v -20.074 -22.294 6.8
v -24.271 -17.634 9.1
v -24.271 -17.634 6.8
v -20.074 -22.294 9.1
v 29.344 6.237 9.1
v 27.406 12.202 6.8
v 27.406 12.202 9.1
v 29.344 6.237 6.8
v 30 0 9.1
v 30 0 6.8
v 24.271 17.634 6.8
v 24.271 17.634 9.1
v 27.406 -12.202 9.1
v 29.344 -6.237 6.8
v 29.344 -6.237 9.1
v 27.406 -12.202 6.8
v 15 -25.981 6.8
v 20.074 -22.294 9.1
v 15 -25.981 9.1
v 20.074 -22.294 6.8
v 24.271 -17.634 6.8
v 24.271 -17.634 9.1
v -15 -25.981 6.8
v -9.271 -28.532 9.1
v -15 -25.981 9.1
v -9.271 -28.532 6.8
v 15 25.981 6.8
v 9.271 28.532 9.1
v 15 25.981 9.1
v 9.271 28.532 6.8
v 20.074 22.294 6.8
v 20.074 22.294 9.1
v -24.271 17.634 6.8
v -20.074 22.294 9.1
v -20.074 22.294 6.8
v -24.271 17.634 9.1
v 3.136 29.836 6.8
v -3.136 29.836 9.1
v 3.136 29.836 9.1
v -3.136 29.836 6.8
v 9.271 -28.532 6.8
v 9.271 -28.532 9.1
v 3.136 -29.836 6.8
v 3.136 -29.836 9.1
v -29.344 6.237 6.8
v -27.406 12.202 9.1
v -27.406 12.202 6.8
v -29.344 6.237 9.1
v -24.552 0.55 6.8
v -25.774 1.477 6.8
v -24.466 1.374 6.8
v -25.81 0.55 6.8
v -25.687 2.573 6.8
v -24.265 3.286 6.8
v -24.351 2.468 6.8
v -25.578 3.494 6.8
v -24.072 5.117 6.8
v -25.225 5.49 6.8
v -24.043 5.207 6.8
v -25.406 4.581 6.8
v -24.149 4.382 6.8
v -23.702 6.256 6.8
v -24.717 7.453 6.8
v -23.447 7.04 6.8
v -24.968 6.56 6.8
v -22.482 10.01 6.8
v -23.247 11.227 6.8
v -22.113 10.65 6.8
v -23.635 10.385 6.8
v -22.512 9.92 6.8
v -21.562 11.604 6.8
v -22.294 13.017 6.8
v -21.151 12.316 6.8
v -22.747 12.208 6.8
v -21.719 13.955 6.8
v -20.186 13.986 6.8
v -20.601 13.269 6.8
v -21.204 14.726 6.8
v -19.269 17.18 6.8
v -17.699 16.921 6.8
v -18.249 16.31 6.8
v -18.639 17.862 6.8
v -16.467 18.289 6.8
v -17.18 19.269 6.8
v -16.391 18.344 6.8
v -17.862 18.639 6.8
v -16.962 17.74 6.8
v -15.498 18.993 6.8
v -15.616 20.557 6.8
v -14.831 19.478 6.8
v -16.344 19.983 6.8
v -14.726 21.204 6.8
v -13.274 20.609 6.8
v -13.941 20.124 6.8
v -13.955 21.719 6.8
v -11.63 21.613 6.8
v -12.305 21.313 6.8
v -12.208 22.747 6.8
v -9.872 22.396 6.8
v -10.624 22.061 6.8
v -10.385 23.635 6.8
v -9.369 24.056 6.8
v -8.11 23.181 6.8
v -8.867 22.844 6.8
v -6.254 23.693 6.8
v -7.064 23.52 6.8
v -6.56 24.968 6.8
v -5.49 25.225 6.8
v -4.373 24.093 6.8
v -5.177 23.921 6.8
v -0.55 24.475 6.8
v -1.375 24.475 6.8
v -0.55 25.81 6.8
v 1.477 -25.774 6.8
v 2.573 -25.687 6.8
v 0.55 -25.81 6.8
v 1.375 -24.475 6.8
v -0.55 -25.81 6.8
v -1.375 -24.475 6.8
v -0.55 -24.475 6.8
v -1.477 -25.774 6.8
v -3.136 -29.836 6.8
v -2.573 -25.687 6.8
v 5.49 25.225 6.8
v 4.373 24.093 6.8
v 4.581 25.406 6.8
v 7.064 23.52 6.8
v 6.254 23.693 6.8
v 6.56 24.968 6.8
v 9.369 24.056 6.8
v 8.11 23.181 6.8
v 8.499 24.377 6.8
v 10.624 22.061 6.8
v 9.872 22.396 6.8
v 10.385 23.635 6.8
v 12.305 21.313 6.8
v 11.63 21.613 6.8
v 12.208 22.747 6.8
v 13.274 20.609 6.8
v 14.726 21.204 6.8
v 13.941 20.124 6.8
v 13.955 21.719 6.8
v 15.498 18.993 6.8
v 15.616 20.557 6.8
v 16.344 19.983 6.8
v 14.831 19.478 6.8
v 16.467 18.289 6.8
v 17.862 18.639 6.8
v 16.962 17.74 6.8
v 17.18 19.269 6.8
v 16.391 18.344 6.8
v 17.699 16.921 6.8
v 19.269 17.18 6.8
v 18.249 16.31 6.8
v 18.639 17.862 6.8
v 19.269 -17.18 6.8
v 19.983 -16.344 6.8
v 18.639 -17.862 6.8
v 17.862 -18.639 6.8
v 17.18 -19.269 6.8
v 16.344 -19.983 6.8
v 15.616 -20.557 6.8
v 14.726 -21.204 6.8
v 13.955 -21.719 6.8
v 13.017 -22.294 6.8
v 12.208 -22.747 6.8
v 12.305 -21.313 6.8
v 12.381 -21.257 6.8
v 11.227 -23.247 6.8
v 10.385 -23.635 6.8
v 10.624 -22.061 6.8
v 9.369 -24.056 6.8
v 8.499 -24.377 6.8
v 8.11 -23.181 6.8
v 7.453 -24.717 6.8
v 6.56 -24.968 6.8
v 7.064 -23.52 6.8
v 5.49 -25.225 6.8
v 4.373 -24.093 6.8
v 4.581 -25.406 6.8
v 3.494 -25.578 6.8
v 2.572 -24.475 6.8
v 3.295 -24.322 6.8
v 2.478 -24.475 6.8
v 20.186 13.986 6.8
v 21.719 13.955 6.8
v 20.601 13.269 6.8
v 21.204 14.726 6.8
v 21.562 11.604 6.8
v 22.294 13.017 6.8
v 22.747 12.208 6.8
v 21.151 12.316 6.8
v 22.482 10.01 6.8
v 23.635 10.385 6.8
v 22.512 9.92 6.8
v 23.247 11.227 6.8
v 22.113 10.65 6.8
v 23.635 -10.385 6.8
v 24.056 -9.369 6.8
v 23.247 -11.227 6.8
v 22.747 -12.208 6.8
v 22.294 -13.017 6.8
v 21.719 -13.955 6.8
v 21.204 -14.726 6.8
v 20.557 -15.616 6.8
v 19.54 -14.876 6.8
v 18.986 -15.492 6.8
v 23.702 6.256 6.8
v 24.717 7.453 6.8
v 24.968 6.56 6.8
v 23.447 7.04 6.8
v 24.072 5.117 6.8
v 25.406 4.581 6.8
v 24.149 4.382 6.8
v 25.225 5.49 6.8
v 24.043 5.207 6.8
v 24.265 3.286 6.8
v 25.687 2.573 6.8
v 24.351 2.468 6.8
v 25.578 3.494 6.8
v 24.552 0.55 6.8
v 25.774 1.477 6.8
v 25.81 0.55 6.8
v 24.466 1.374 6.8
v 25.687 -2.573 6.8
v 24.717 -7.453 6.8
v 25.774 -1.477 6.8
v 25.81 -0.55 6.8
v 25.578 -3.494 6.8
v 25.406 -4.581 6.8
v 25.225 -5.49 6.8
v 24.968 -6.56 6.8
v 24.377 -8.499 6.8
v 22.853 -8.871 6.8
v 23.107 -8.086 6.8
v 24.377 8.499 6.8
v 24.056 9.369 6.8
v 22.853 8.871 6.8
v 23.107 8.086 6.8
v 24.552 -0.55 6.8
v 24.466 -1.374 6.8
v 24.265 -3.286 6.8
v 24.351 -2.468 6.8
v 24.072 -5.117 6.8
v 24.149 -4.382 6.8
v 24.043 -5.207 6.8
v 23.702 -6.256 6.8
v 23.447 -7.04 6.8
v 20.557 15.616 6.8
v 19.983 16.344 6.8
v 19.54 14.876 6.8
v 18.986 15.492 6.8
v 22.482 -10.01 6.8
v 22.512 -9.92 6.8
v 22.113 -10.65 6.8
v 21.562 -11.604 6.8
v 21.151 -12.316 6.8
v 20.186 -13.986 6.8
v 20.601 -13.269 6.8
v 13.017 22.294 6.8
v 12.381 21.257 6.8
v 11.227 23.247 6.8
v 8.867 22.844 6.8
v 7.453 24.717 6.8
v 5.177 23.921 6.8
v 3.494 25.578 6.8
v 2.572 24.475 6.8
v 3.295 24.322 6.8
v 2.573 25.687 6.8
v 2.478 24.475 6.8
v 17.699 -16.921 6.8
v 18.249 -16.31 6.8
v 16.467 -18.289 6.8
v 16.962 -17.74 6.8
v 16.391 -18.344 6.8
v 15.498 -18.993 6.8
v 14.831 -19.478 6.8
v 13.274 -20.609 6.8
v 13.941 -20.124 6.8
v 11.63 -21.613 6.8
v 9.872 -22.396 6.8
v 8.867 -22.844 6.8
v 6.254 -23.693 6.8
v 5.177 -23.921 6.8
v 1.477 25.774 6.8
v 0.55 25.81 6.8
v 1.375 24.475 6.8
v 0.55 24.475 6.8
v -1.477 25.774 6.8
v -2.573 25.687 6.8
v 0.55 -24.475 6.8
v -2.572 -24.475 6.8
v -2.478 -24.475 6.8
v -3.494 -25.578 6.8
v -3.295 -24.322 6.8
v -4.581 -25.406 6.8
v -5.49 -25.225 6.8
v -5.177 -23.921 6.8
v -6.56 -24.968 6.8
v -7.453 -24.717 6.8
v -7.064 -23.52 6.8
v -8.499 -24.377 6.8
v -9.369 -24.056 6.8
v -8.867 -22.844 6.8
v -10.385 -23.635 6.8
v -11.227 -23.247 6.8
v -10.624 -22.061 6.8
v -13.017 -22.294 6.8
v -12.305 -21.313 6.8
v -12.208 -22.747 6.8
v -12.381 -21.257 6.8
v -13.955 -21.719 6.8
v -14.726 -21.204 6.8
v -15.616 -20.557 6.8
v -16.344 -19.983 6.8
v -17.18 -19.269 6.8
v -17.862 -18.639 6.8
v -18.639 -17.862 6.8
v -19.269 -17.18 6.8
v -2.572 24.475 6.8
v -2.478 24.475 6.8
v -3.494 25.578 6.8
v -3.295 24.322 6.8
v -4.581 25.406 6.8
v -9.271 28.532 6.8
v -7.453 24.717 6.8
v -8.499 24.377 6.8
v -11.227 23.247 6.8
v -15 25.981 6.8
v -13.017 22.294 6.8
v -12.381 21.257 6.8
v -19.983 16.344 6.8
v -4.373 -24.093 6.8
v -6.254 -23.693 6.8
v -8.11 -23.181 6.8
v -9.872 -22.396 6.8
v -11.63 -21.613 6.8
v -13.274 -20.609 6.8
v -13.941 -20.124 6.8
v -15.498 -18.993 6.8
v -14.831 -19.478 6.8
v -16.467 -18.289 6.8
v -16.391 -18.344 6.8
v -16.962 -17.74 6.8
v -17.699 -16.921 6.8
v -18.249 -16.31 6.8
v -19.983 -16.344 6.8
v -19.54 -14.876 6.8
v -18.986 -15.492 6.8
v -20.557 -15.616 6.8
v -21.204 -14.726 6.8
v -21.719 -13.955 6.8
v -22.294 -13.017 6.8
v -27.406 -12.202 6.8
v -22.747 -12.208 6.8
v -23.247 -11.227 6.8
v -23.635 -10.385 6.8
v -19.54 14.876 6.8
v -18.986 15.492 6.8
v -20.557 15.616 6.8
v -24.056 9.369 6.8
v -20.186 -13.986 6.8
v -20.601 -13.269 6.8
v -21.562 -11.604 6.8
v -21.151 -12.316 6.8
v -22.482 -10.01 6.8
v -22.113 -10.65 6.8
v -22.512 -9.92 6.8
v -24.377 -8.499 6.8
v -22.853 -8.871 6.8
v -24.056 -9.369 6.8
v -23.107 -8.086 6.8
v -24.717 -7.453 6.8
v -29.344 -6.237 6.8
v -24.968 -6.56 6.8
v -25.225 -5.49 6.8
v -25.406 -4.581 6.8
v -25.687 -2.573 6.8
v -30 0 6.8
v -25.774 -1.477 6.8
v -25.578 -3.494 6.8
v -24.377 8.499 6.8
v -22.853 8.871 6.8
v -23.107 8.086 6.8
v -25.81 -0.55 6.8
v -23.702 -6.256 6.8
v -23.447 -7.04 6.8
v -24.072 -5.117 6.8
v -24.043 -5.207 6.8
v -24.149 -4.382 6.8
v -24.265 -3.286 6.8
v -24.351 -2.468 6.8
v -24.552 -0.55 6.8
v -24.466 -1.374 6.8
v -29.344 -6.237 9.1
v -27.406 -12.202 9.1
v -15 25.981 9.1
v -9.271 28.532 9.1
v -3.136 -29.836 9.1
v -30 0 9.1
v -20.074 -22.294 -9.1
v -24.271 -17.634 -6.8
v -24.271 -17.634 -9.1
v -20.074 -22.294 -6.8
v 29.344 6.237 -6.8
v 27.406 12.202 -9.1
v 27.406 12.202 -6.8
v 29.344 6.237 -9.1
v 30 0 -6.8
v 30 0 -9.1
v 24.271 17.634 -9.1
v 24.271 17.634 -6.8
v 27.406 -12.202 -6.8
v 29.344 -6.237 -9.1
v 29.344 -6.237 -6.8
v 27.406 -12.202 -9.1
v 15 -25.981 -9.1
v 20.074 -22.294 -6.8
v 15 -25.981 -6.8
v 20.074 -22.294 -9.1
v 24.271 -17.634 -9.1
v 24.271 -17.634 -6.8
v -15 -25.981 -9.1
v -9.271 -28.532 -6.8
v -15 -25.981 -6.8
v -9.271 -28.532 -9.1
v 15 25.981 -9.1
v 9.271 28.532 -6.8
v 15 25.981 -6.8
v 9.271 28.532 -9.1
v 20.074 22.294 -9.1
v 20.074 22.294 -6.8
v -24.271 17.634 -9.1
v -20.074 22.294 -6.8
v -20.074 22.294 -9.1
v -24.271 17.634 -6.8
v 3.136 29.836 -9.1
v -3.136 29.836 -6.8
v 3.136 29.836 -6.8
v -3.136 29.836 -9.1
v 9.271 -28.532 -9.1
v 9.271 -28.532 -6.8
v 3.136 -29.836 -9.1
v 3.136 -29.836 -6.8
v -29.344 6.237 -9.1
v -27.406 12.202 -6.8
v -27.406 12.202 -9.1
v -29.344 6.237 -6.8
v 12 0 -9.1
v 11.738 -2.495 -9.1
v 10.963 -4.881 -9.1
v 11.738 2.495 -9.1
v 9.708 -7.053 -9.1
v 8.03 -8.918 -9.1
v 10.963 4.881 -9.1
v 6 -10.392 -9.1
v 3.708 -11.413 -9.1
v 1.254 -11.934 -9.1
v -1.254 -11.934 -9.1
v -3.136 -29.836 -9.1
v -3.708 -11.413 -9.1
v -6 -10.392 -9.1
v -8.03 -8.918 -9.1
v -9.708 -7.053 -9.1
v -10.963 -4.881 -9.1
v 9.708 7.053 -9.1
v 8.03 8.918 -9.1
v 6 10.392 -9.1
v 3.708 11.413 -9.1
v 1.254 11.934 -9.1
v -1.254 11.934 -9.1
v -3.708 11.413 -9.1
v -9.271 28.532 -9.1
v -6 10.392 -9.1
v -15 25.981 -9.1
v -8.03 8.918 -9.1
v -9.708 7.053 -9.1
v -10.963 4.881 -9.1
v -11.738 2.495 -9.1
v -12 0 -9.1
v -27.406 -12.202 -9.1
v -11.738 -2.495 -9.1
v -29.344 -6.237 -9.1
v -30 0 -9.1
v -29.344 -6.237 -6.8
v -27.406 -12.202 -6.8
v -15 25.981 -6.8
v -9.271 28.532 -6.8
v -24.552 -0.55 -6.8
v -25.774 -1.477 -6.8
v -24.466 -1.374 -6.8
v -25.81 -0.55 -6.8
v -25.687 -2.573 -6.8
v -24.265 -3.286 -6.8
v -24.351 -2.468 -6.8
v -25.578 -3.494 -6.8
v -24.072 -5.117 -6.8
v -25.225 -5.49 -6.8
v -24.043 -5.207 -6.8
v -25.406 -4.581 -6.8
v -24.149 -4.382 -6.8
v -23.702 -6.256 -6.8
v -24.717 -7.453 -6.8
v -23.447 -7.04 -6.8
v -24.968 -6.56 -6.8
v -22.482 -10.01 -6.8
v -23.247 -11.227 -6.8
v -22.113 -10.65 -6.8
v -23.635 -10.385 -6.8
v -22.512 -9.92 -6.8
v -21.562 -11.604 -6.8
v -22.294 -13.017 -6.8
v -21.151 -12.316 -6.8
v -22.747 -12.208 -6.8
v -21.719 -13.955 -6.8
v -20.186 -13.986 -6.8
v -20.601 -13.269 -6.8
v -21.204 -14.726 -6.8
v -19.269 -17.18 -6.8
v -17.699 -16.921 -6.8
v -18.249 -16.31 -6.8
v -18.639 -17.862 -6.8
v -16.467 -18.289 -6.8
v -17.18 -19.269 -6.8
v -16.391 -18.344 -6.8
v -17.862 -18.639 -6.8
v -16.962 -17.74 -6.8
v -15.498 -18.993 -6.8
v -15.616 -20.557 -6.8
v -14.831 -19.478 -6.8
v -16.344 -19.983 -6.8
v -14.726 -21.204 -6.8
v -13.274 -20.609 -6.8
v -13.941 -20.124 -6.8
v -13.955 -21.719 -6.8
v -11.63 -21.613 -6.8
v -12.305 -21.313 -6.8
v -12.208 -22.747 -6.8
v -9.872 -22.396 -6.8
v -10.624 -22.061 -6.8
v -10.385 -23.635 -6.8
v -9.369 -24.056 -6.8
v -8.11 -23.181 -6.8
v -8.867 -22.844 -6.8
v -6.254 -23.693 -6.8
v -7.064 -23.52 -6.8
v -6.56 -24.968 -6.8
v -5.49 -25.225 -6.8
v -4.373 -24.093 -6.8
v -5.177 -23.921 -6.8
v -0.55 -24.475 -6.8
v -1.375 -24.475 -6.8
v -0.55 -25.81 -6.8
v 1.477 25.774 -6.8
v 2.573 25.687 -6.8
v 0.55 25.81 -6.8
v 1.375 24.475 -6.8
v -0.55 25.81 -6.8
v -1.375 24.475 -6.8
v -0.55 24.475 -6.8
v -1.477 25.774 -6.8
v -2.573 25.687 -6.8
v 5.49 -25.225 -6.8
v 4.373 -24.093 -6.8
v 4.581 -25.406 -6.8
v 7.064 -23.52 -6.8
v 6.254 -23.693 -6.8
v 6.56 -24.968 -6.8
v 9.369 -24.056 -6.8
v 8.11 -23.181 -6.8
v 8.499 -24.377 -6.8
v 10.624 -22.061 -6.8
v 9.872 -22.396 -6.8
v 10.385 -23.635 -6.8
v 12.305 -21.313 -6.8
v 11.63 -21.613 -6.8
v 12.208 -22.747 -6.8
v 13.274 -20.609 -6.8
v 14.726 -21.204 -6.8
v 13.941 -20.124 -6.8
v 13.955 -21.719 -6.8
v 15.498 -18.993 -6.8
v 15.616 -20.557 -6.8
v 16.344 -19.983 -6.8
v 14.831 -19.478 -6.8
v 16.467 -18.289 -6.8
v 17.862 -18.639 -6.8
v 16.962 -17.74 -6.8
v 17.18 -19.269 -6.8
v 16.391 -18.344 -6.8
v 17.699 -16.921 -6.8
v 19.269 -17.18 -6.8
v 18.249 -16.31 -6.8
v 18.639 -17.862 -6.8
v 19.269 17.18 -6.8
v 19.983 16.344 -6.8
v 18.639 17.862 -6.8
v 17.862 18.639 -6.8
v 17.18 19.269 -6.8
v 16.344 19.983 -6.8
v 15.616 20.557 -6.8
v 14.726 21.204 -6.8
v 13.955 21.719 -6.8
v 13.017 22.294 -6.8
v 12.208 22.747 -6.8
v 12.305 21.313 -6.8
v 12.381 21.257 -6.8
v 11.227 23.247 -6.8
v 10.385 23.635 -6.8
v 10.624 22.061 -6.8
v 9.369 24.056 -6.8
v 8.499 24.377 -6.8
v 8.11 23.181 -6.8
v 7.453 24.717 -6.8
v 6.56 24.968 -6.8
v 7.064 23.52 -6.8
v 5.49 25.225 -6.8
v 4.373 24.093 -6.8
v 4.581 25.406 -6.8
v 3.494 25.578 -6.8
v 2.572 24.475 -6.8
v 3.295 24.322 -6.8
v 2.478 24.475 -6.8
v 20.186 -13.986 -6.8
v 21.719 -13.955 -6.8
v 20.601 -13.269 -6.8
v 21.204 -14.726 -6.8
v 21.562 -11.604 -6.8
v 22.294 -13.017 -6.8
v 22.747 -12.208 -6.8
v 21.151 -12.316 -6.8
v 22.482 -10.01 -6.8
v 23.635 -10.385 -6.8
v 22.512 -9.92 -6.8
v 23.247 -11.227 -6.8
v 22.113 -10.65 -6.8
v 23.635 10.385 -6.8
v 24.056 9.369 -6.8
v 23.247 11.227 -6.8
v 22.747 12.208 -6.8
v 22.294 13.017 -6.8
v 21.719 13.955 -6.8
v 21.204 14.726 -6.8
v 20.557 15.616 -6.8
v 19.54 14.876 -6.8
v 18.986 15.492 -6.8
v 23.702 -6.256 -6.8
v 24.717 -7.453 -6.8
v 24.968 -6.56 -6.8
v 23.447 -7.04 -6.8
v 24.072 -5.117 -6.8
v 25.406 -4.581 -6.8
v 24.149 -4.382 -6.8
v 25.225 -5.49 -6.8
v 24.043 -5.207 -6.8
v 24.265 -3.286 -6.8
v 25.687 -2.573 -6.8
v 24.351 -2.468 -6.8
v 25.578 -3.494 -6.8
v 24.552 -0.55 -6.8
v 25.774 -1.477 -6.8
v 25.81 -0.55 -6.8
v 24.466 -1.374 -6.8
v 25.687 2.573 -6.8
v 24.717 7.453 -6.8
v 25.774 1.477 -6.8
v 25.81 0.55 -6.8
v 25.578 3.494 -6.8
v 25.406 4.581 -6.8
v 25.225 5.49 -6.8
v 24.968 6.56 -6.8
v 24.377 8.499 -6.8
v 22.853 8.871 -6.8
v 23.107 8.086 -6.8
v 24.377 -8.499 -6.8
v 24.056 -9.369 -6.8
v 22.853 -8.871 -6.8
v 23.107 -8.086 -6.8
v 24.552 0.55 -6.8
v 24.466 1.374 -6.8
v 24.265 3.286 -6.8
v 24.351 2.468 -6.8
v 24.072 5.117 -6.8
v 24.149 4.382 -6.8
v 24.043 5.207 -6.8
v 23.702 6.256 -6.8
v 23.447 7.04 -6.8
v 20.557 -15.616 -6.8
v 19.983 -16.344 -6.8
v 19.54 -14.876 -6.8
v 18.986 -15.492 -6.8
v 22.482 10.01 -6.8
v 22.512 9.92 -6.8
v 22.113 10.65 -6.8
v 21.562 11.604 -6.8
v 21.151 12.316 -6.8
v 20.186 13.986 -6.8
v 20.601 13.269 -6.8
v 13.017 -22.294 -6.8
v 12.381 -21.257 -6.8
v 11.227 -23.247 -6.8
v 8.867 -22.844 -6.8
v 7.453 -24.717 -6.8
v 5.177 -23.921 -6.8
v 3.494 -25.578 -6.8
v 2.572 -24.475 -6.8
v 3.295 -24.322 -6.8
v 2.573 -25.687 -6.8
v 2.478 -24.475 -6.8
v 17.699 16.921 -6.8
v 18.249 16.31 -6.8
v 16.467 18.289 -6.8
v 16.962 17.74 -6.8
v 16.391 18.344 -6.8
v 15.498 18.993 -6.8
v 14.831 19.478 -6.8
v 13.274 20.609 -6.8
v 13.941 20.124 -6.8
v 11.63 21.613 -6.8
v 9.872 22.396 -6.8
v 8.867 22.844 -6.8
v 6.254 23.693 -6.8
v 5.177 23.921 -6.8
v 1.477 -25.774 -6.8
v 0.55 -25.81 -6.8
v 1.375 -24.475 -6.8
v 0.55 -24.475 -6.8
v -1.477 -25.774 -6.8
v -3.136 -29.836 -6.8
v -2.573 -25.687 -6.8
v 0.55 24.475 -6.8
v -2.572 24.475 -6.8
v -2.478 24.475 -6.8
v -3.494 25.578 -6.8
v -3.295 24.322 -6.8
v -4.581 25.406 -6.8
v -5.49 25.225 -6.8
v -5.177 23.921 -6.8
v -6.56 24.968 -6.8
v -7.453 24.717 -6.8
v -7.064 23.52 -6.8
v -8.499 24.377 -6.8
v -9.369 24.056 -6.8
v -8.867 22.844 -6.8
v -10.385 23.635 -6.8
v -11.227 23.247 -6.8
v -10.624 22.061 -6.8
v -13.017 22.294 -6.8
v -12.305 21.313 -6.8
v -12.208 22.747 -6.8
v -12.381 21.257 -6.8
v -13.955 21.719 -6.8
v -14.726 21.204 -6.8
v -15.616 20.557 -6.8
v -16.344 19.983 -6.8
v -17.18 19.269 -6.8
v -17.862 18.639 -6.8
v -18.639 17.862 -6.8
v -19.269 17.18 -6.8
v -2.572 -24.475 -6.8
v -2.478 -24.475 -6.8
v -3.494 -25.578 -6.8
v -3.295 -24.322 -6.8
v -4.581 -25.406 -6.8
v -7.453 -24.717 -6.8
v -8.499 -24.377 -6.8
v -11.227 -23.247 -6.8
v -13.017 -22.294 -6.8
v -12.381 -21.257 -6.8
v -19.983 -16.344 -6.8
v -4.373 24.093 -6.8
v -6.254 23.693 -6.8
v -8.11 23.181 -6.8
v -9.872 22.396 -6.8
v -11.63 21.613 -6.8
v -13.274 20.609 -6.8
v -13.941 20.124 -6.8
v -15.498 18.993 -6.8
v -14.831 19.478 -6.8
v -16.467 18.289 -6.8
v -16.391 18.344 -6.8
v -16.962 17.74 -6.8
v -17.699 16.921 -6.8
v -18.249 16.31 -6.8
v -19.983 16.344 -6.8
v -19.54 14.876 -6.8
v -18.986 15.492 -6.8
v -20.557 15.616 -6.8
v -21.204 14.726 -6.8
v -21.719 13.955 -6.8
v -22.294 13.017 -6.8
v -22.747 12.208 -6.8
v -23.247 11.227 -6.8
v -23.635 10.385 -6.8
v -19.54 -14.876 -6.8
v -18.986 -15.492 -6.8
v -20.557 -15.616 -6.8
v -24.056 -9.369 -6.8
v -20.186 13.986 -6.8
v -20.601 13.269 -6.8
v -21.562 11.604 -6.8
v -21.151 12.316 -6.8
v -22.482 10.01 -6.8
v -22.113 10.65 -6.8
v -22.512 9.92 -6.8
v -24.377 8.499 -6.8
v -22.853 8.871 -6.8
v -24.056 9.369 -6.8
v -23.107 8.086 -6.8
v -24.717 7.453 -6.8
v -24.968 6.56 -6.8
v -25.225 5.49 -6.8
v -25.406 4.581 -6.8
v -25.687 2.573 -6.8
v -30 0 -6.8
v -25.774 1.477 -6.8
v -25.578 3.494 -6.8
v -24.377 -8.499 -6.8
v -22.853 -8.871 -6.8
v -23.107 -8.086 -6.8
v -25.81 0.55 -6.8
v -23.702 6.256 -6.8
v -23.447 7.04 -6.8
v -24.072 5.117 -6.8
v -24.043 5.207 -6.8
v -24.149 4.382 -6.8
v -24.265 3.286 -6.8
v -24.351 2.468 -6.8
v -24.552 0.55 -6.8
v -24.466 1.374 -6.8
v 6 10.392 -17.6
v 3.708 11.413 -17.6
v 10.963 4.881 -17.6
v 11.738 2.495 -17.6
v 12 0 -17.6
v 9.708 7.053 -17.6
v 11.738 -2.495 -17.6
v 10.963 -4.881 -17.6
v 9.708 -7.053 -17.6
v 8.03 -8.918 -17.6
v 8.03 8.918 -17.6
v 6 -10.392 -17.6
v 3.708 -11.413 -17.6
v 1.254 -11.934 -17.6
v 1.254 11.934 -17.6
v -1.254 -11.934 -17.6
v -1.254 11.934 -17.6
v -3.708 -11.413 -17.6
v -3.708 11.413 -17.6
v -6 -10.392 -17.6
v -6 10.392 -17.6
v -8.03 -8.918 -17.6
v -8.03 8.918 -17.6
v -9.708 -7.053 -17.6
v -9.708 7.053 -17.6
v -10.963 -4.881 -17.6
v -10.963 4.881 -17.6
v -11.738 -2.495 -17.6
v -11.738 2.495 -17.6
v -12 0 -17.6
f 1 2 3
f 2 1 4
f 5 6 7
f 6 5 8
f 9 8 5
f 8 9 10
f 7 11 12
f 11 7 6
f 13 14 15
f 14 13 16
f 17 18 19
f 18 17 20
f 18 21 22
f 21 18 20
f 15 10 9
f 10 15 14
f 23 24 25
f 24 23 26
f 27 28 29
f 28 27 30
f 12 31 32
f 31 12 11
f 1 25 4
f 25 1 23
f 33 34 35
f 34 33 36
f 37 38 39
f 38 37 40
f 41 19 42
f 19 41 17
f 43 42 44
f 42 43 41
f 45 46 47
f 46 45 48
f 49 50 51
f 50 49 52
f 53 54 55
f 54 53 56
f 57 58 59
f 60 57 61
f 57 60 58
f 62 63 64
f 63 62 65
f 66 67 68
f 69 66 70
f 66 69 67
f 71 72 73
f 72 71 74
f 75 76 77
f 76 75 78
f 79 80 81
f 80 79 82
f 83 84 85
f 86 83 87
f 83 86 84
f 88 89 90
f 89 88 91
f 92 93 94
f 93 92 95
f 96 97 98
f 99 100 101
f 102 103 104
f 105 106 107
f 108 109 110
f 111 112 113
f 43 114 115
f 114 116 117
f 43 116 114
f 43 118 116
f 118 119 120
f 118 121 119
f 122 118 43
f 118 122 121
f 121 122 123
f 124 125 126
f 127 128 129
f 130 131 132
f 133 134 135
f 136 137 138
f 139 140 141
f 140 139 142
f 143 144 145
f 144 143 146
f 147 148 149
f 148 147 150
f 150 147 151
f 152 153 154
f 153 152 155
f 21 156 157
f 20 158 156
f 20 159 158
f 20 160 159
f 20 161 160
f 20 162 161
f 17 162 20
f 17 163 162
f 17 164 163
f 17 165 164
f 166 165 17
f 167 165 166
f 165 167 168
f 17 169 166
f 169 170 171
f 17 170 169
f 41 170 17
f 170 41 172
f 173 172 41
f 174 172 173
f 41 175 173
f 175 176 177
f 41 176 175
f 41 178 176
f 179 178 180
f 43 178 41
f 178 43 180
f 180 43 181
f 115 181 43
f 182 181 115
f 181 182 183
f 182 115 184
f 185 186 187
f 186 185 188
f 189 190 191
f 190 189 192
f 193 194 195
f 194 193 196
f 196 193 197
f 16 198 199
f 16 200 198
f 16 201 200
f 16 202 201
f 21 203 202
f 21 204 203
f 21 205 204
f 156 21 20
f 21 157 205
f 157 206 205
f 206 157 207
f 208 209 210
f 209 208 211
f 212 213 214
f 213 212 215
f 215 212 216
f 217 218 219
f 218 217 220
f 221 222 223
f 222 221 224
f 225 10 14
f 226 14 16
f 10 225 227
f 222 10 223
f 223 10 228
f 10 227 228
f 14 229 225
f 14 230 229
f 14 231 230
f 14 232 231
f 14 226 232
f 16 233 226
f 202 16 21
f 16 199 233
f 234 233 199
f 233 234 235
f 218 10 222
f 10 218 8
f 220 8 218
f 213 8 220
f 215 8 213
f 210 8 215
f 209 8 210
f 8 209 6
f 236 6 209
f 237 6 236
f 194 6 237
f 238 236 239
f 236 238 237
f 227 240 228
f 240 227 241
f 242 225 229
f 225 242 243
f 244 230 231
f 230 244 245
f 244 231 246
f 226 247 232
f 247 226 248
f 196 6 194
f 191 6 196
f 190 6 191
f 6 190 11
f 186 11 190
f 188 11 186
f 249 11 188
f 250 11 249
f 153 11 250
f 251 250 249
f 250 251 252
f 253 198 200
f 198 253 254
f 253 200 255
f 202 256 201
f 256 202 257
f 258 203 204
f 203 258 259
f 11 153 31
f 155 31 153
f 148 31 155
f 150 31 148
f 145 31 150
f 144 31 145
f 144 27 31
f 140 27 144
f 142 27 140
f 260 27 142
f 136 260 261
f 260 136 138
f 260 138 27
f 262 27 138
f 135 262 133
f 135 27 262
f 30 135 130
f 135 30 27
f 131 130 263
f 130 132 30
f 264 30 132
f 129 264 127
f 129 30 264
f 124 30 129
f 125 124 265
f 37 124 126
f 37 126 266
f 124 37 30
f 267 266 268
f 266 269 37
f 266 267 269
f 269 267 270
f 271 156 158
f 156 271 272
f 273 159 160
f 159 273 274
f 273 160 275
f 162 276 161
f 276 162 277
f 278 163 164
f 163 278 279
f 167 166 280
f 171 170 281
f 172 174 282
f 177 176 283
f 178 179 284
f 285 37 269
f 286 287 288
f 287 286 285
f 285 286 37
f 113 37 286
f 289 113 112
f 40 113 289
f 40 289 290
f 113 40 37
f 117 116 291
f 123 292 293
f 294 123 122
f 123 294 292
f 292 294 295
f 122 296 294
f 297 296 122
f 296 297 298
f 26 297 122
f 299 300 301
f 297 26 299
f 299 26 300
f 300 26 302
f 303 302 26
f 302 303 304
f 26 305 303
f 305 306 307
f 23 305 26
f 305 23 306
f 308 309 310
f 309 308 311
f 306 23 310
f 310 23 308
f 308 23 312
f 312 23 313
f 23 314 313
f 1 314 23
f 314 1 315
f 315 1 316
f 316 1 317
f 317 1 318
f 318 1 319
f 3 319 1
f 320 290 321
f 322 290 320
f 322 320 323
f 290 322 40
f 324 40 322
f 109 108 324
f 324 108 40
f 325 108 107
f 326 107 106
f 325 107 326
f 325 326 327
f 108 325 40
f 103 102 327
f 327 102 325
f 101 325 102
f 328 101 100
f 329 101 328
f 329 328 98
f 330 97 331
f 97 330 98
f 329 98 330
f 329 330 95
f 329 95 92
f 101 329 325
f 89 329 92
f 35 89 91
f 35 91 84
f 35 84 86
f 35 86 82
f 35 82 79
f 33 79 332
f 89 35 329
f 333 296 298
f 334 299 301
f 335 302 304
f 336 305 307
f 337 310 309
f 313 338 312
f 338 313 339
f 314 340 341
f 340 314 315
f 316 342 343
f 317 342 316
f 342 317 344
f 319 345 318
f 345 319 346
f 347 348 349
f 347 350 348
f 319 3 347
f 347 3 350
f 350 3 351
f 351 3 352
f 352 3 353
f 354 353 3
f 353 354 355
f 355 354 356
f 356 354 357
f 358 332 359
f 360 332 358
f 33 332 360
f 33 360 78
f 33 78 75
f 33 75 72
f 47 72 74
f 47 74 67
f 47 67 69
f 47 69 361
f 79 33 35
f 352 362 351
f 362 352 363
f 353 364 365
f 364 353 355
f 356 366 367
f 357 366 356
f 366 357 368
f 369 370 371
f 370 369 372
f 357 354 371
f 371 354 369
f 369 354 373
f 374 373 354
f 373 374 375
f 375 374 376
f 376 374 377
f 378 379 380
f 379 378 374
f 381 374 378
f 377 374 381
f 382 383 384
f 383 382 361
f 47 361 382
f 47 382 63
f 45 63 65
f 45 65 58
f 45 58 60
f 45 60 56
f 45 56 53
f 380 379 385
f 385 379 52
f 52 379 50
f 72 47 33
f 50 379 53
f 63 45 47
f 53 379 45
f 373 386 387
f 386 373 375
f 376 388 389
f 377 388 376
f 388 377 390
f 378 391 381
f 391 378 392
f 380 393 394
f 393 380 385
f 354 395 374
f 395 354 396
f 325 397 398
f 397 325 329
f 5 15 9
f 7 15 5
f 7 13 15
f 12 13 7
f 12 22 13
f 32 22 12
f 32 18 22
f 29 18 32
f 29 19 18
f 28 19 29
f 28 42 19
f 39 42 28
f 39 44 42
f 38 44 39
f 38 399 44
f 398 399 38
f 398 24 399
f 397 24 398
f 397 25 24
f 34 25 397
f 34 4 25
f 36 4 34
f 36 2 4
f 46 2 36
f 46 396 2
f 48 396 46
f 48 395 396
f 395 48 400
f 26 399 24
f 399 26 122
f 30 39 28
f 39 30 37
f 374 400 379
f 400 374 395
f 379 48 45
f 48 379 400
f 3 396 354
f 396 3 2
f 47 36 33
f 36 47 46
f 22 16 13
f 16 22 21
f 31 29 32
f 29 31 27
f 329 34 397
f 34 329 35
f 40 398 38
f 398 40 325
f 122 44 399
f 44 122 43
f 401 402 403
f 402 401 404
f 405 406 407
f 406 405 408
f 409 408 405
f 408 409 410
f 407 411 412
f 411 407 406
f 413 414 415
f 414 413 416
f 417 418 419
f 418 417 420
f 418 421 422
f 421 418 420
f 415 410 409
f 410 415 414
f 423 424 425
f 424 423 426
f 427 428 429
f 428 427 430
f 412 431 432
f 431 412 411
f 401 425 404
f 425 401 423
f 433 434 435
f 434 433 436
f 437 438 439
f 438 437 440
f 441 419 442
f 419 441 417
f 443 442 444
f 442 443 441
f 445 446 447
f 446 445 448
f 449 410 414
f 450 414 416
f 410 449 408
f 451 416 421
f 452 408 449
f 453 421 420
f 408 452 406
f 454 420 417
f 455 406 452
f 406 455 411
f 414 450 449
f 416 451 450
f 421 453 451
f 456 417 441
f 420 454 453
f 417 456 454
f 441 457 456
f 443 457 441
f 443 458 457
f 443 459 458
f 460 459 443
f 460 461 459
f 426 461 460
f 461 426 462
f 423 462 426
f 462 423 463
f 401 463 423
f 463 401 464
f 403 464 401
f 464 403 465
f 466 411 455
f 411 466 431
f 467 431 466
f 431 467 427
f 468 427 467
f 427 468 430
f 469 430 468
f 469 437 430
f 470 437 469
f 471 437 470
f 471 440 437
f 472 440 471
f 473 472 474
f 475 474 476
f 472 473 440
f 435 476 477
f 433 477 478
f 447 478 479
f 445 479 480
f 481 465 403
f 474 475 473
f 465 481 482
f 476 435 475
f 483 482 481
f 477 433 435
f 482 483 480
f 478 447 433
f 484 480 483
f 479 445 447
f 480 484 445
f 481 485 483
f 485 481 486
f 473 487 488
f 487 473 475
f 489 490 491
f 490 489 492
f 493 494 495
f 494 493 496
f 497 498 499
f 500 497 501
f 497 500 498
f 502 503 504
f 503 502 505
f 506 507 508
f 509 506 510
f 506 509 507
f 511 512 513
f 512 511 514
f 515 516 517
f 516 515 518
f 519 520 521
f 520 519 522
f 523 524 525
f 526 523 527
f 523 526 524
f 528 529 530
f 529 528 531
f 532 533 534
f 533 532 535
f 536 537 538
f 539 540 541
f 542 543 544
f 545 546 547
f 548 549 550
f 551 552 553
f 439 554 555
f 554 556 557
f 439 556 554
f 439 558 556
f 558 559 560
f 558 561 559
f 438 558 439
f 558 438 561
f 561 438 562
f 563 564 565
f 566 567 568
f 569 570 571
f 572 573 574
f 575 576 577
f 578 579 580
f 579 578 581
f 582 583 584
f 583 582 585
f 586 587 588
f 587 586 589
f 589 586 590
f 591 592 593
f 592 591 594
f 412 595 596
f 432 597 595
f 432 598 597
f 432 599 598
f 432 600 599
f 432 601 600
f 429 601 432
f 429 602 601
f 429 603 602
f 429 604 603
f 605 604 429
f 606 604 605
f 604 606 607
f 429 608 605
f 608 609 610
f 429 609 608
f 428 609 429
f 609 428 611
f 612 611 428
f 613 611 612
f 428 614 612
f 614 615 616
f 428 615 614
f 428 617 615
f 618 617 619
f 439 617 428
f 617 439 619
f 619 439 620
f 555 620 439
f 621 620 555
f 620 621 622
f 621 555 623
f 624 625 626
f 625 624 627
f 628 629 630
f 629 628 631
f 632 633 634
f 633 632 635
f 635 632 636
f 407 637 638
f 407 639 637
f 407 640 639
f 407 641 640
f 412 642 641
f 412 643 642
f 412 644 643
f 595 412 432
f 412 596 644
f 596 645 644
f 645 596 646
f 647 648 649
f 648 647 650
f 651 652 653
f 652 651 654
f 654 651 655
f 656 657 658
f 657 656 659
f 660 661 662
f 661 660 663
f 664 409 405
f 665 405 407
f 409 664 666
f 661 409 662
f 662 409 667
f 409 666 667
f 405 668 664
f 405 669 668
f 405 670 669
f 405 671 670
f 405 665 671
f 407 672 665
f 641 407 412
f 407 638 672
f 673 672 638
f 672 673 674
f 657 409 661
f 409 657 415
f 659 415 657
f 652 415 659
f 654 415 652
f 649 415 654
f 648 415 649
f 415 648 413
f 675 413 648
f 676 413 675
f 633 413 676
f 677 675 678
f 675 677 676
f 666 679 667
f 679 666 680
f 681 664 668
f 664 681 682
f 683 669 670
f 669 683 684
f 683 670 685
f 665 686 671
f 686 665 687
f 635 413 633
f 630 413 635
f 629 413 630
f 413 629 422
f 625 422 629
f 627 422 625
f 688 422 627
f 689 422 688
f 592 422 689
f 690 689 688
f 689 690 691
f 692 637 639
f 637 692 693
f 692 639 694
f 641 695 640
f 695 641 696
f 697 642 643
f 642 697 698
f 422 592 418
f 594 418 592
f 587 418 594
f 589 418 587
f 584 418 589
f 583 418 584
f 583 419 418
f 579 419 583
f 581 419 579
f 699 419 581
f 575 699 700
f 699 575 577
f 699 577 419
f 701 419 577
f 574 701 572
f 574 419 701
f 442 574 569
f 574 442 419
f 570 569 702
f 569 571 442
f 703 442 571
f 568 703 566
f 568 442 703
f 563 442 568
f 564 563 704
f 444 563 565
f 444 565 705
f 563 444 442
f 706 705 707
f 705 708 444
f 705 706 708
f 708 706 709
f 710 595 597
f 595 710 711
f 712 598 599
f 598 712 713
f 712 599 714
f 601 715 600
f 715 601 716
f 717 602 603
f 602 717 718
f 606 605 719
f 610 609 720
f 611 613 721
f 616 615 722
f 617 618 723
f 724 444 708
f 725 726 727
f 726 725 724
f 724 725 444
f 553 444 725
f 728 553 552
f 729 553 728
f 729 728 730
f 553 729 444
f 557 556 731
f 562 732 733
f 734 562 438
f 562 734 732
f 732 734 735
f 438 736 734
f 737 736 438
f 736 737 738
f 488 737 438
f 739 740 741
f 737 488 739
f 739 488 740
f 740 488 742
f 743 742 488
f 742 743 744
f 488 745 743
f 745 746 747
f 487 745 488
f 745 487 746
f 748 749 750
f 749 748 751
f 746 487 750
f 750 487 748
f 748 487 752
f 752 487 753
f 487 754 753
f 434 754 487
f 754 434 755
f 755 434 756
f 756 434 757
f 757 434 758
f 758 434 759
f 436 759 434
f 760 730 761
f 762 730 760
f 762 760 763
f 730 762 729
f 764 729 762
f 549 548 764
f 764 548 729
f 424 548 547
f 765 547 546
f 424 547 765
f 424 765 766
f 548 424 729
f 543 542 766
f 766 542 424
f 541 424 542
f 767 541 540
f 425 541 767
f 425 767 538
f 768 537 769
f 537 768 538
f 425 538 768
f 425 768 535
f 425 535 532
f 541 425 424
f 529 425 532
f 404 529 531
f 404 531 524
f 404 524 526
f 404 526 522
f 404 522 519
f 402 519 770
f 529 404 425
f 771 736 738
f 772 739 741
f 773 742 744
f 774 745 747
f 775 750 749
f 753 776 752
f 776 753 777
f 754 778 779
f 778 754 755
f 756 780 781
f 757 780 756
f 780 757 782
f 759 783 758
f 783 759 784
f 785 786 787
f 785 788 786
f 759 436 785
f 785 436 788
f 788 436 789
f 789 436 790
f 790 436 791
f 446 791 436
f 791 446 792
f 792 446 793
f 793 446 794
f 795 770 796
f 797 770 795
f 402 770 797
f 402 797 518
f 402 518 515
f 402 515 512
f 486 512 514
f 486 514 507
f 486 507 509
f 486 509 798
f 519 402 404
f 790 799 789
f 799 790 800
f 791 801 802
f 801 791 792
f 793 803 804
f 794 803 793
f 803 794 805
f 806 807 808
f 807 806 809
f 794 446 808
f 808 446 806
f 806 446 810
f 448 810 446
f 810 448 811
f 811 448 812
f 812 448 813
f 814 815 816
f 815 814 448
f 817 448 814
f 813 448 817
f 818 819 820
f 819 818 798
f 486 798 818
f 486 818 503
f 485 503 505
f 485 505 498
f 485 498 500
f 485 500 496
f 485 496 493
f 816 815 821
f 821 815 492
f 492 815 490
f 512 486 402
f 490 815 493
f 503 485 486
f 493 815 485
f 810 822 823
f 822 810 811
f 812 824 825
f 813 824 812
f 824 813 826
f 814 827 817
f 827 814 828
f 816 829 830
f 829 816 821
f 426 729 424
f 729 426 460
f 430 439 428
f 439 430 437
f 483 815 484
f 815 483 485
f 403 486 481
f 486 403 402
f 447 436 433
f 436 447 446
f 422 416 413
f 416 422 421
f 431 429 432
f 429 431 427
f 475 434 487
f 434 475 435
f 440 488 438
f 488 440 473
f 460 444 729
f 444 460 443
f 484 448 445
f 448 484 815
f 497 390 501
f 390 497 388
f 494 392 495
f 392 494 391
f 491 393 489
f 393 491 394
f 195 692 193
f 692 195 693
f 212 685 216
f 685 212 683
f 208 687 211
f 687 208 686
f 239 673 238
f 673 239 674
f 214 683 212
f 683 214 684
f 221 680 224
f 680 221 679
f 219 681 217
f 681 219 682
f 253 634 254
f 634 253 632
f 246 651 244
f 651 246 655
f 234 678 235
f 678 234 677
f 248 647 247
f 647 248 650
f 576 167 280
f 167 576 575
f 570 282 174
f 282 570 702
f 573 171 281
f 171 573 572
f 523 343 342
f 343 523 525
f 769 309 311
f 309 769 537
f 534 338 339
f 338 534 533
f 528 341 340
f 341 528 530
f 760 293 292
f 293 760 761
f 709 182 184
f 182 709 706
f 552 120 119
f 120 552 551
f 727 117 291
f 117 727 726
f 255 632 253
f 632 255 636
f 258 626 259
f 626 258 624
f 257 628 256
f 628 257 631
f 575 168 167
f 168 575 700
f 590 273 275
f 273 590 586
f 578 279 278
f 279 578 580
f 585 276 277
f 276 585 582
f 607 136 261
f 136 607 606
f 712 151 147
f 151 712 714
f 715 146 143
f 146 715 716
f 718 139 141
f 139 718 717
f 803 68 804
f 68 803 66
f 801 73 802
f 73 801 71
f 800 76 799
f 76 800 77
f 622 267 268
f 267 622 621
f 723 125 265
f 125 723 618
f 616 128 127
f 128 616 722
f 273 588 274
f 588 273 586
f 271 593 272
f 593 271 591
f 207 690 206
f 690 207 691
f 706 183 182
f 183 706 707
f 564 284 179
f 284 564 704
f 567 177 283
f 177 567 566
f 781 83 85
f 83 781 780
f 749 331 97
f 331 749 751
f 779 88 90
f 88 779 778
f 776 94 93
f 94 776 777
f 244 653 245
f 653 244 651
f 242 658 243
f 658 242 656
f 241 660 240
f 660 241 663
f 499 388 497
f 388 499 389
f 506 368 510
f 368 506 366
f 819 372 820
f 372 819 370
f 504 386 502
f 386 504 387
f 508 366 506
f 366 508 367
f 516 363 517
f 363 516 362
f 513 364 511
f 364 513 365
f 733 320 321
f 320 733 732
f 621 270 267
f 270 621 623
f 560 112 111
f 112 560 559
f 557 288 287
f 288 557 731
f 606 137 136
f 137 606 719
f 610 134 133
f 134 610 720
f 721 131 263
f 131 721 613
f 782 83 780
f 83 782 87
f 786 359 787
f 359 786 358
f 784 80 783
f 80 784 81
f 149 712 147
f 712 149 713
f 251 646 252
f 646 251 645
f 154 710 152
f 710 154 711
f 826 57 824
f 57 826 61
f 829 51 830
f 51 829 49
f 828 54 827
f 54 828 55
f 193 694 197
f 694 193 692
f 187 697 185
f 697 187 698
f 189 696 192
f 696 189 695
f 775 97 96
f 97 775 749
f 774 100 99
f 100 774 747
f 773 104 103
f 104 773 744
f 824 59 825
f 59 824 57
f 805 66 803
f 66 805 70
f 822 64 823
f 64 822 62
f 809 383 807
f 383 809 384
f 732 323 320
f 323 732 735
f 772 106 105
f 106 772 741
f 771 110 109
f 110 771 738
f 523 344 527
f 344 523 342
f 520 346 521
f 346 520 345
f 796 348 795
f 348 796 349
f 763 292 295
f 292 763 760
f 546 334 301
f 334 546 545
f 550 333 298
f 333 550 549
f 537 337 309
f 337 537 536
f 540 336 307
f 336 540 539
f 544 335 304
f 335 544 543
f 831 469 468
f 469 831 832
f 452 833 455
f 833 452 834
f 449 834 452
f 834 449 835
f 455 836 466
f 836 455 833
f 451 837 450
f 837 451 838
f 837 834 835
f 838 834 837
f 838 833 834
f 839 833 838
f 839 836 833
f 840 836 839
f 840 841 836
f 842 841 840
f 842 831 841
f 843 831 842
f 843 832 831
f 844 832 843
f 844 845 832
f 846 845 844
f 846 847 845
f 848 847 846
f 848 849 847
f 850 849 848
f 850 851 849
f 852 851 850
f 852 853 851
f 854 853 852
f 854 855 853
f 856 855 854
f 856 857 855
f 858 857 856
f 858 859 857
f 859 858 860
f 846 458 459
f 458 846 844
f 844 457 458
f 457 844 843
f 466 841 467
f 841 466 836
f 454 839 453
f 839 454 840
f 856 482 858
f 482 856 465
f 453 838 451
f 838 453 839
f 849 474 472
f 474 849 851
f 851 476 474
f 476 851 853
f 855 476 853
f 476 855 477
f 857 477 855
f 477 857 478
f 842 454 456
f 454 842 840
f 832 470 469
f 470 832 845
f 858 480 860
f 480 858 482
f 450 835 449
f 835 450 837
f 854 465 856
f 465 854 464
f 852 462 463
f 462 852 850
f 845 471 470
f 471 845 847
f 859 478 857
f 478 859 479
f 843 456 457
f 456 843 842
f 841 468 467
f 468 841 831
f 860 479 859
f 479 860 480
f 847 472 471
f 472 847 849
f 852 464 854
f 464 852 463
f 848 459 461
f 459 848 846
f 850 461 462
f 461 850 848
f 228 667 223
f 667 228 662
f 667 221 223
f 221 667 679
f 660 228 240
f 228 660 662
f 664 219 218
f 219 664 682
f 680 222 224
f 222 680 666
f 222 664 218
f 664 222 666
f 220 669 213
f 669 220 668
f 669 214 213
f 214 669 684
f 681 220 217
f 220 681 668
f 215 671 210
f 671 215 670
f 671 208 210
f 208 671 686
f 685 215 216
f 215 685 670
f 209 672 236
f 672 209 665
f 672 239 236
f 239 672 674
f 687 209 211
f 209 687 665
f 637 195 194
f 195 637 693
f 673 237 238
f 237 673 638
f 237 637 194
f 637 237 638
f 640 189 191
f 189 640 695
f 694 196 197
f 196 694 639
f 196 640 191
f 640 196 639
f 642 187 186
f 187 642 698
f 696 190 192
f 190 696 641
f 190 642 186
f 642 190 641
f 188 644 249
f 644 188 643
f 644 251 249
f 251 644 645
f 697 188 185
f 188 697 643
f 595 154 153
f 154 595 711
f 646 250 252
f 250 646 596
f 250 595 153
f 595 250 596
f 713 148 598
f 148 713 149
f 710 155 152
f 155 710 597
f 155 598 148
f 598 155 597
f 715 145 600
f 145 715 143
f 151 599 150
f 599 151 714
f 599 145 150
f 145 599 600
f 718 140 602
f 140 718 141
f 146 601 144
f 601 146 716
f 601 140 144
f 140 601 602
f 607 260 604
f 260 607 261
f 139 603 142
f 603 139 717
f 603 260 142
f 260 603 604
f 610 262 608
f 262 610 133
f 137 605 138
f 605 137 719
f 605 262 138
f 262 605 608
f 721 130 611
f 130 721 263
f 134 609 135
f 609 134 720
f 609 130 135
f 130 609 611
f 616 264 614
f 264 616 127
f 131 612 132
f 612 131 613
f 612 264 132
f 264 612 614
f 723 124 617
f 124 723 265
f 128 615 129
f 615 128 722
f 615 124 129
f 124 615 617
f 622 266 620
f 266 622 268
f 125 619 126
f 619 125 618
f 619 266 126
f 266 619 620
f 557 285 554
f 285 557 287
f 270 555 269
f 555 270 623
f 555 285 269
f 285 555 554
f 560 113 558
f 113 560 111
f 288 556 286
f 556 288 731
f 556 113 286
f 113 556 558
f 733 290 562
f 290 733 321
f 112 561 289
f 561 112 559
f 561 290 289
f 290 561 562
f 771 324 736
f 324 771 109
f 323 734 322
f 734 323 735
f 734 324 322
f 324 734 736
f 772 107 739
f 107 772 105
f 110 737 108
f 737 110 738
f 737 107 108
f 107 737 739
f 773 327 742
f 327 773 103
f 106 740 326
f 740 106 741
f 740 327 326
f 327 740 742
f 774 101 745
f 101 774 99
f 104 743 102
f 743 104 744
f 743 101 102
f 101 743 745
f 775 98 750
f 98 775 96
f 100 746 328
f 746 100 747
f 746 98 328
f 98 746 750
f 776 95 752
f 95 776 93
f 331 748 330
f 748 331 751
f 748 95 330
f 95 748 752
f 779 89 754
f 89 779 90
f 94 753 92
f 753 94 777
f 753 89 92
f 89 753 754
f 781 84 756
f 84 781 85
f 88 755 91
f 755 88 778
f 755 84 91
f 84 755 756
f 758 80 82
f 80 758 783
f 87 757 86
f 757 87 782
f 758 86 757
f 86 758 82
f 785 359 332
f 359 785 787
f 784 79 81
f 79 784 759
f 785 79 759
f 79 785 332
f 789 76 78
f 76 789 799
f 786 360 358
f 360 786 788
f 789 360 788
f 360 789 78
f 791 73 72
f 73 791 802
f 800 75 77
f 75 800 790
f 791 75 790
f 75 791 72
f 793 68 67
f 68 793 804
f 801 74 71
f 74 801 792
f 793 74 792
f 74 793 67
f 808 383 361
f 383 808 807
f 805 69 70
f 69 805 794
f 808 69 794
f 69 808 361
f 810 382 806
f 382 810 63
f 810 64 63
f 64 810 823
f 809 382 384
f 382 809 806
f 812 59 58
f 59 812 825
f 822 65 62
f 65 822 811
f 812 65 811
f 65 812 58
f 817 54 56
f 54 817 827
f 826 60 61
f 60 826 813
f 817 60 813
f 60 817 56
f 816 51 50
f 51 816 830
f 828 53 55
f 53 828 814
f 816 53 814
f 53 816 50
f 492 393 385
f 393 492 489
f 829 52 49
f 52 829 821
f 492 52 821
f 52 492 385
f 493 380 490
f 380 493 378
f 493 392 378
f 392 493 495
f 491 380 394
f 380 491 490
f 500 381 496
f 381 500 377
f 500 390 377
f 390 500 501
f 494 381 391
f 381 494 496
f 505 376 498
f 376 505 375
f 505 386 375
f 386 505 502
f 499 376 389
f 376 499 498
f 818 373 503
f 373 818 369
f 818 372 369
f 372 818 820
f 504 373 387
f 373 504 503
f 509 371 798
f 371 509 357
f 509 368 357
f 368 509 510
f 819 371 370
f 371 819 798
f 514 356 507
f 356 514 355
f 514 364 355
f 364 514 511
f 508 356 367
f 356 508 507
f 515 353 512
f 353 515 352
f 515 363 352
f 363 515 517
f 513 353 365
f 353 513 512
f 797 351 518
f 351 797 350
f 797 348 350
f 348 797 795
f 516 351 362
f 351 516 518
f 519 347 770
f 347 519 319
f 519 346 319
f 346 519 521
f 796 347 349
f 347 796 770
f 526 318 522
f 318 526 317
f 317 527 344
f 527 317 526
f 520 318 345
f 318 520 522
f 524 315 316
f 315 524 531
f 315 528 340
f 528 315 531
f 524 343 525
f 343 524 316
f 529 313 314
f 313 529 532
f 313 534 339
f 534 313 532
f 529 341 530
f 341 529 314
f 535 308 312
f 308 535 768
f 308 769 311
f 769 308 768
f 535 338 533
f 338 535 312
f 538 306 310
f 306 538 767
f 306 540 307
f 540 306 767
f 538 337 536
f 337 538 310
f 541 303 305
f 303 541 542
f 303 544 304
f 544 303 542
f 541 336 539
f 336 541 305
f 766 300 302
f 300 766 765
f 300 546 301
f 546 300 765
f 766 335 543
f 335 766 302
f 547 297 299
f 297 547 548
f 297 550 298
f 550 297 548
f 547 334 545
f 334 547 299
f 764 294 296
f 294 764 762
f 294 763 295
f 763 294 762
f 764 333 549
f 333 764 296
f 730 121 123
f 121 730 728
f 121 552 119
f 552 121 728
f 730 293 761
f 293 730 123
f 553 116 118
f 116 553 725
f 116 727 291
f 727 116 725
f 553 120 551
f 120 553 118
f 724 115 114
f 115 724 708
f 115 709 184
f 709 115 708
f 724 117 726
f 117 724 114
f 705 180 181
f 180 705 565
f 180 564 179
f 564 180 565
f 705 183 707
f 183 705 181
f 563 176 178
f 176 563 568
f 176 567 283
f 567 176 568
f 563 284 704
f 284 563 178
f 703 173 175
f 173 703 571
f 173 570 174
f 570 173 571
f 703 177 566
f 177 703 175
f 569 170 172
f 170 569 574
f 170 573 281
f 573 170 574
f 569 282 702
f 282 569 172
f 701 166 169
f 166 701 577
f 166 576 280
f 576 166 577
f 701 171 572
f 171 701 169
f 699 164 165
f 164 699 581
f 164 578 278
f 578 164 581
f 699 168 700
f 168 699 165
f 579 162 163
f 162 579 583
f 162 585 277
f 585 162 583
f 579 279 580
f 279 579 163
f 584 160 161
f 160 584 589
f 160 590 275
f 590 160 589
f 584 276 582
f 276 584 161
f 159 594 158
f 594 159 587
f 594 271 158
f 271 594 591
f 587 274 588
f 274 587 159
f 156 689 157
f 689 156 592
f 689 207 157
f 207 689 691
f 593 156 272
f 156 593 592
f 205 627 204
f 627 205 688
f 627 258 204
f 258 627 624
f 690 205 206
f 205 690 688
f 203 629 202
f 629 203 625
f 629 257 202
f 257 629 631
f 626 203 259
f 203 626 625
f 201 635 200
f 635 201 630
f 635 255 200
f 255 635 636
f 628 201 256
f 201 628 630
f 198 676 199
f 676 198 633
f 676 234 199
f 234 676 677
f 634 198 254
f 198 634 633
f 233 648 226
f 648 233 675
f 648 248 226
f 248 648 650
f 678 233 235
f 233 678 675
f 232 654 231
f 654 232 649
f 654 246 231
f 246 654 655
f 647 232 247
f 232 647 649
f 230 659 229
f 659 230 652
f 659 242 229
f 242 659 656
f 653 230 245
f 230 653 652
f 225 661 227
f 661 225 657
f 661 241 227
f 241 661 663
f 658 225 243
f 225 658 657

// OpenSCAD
// Parameters
tooth_count = 80; //[20:200:1]
pitch_diameter_mm = 50.42; //[25.21:100.84:0.01]
belt_pitch_mm = 2; //[1:10:0.01]
tooth_profile = 0; //[0:2:1]
pulley_width_mm = 16; //[8:32:0.5]
bore_diameter_mm = 8; //[3:20:0.01]
hub_diameter_mm = 24; //[12:48:0.1]
hub_length_mm = 10; //[0:30:0.5]
flange_diameter_mm = 60; //[40:90:0.1]
flange_thickness_mm = 1.5; //[0:4:0.1]
set_screw_count = 2; //[0:4:1]
set_screw_thread = 3; //[2:6:1]
set_screw_z_offset_mm = 5; //[0:20:0.5]
keyway_width_mm = 0; //[0:8:0.1]
keyway_depth_mm = 0; //[0:4:0.1]
shaft_flat_depth_mm = 0; //[0:3:0.1]
tolerance_mm = 0.2; //[0:0.6:0.01]
tooth_radial_height_mm = 1.2; //[0.6:2.4:0.05]
tooth_root_clearance_mm = 0.6; //[0.2:1.5:0.05]
tooth_width_factor = 0.55; //[0.35:0.75:0.01]
overlap_mm = 0.8; //[0.5:2:0.1]

// Pulley - complete geometry
module pulley() {
  color("Silver") {
    // Toothed pulley body
    cylinder(h=pulley_width_mm, r=(pitch_diameter_mm/2) - tooth_root_clearance_mm, center=true);
    
    // Hub
    translate([0, 0, -pulley_width_mm/2 - hub_length_mm/2 + overlap_mm])
      cylinder(h=hub_length_mm + overlap_mm, r=hub_diameter_mm/2, center=true);
    
    // Flanges
    if (flange_thickness_mm > 0) {
      translate([0, 0, pulley_width_mm/2 + flange_thickness_mm/2 - overlap_mm])
        cylinder(h=flange_thickness_mm + overlap_mm, r=flange_diameter_mm/2, center=true);
      translate([0, 0, -pulley_width_mm/2 - flange_thickness_mm/2 + overlap_mm])
        cylinder(h=flange_thickness_mm + overlap_mm, r=flange_diameter_mm/2, center=true);
    }
  }
}

// Printed Pulley Teeth From Profile
module printed_pulley_teeth_from_profile() {
  color("DimGray") {
    for (i = [0:tooth_count-1]) {
      rotate([0, 0, i*360/tooth_count])
        translate([(pitch_diameter_mm/2) - tooth_root_clearance_mm + (tooth_radial_height_mm + overlap_mm)/2 - overlap_mm, 0, 0])
        cube([tooth_radial_height_mm + overlap_mm, belt_pitch_mm*tooth_width_factor, pulley_width_mm], center=true);
    }
  }
}

// Printed Pulley GT2 Teeth
module printed_pulley_GT2_teeth() {
  color("DimGray") {
    for (i = [0:tooth_count-1]) {
      rotate([0, 0, i*360/tooth_count])
        translate([(pitch_diameter_mm/2) - tooth_root_clearance_mm + (tooth_radial_height_mm + overlap_mm)/2 - overlap_mm, 0, 0])
        cube([tooth_radial_height_mm + overlap_mm, belt_pitch_mm*tooth_width_factor, pulley_width_mm], center=true);
    }
  }
}

// Printed Pulley Teeth
module printed_pulley_teeth() {
  color("DimGray") {
    for (i = [0:tooth_count-1]) {
      rotate([0, 0, i*360/tooth_count])
        translate([(pitch_diameter_mm/2) - tooth_root_clearance_mm + (tooth_radial_height_mm + overlap_mm)/2 - overlap_mm, 0, 0])
        cube([tooth_radial_height_mm + overlap_mm, belt_pitch_mm*tooth_width_factor, pulley_width_mm], center=true);
    }
  }
}

// Assembly
module assembly() {
  pulley();
  printed_pulley_teeth_from_profile();
  printed_pulley_GT2_teeth();
  printed_pulley_teeth();
}

assembly();
